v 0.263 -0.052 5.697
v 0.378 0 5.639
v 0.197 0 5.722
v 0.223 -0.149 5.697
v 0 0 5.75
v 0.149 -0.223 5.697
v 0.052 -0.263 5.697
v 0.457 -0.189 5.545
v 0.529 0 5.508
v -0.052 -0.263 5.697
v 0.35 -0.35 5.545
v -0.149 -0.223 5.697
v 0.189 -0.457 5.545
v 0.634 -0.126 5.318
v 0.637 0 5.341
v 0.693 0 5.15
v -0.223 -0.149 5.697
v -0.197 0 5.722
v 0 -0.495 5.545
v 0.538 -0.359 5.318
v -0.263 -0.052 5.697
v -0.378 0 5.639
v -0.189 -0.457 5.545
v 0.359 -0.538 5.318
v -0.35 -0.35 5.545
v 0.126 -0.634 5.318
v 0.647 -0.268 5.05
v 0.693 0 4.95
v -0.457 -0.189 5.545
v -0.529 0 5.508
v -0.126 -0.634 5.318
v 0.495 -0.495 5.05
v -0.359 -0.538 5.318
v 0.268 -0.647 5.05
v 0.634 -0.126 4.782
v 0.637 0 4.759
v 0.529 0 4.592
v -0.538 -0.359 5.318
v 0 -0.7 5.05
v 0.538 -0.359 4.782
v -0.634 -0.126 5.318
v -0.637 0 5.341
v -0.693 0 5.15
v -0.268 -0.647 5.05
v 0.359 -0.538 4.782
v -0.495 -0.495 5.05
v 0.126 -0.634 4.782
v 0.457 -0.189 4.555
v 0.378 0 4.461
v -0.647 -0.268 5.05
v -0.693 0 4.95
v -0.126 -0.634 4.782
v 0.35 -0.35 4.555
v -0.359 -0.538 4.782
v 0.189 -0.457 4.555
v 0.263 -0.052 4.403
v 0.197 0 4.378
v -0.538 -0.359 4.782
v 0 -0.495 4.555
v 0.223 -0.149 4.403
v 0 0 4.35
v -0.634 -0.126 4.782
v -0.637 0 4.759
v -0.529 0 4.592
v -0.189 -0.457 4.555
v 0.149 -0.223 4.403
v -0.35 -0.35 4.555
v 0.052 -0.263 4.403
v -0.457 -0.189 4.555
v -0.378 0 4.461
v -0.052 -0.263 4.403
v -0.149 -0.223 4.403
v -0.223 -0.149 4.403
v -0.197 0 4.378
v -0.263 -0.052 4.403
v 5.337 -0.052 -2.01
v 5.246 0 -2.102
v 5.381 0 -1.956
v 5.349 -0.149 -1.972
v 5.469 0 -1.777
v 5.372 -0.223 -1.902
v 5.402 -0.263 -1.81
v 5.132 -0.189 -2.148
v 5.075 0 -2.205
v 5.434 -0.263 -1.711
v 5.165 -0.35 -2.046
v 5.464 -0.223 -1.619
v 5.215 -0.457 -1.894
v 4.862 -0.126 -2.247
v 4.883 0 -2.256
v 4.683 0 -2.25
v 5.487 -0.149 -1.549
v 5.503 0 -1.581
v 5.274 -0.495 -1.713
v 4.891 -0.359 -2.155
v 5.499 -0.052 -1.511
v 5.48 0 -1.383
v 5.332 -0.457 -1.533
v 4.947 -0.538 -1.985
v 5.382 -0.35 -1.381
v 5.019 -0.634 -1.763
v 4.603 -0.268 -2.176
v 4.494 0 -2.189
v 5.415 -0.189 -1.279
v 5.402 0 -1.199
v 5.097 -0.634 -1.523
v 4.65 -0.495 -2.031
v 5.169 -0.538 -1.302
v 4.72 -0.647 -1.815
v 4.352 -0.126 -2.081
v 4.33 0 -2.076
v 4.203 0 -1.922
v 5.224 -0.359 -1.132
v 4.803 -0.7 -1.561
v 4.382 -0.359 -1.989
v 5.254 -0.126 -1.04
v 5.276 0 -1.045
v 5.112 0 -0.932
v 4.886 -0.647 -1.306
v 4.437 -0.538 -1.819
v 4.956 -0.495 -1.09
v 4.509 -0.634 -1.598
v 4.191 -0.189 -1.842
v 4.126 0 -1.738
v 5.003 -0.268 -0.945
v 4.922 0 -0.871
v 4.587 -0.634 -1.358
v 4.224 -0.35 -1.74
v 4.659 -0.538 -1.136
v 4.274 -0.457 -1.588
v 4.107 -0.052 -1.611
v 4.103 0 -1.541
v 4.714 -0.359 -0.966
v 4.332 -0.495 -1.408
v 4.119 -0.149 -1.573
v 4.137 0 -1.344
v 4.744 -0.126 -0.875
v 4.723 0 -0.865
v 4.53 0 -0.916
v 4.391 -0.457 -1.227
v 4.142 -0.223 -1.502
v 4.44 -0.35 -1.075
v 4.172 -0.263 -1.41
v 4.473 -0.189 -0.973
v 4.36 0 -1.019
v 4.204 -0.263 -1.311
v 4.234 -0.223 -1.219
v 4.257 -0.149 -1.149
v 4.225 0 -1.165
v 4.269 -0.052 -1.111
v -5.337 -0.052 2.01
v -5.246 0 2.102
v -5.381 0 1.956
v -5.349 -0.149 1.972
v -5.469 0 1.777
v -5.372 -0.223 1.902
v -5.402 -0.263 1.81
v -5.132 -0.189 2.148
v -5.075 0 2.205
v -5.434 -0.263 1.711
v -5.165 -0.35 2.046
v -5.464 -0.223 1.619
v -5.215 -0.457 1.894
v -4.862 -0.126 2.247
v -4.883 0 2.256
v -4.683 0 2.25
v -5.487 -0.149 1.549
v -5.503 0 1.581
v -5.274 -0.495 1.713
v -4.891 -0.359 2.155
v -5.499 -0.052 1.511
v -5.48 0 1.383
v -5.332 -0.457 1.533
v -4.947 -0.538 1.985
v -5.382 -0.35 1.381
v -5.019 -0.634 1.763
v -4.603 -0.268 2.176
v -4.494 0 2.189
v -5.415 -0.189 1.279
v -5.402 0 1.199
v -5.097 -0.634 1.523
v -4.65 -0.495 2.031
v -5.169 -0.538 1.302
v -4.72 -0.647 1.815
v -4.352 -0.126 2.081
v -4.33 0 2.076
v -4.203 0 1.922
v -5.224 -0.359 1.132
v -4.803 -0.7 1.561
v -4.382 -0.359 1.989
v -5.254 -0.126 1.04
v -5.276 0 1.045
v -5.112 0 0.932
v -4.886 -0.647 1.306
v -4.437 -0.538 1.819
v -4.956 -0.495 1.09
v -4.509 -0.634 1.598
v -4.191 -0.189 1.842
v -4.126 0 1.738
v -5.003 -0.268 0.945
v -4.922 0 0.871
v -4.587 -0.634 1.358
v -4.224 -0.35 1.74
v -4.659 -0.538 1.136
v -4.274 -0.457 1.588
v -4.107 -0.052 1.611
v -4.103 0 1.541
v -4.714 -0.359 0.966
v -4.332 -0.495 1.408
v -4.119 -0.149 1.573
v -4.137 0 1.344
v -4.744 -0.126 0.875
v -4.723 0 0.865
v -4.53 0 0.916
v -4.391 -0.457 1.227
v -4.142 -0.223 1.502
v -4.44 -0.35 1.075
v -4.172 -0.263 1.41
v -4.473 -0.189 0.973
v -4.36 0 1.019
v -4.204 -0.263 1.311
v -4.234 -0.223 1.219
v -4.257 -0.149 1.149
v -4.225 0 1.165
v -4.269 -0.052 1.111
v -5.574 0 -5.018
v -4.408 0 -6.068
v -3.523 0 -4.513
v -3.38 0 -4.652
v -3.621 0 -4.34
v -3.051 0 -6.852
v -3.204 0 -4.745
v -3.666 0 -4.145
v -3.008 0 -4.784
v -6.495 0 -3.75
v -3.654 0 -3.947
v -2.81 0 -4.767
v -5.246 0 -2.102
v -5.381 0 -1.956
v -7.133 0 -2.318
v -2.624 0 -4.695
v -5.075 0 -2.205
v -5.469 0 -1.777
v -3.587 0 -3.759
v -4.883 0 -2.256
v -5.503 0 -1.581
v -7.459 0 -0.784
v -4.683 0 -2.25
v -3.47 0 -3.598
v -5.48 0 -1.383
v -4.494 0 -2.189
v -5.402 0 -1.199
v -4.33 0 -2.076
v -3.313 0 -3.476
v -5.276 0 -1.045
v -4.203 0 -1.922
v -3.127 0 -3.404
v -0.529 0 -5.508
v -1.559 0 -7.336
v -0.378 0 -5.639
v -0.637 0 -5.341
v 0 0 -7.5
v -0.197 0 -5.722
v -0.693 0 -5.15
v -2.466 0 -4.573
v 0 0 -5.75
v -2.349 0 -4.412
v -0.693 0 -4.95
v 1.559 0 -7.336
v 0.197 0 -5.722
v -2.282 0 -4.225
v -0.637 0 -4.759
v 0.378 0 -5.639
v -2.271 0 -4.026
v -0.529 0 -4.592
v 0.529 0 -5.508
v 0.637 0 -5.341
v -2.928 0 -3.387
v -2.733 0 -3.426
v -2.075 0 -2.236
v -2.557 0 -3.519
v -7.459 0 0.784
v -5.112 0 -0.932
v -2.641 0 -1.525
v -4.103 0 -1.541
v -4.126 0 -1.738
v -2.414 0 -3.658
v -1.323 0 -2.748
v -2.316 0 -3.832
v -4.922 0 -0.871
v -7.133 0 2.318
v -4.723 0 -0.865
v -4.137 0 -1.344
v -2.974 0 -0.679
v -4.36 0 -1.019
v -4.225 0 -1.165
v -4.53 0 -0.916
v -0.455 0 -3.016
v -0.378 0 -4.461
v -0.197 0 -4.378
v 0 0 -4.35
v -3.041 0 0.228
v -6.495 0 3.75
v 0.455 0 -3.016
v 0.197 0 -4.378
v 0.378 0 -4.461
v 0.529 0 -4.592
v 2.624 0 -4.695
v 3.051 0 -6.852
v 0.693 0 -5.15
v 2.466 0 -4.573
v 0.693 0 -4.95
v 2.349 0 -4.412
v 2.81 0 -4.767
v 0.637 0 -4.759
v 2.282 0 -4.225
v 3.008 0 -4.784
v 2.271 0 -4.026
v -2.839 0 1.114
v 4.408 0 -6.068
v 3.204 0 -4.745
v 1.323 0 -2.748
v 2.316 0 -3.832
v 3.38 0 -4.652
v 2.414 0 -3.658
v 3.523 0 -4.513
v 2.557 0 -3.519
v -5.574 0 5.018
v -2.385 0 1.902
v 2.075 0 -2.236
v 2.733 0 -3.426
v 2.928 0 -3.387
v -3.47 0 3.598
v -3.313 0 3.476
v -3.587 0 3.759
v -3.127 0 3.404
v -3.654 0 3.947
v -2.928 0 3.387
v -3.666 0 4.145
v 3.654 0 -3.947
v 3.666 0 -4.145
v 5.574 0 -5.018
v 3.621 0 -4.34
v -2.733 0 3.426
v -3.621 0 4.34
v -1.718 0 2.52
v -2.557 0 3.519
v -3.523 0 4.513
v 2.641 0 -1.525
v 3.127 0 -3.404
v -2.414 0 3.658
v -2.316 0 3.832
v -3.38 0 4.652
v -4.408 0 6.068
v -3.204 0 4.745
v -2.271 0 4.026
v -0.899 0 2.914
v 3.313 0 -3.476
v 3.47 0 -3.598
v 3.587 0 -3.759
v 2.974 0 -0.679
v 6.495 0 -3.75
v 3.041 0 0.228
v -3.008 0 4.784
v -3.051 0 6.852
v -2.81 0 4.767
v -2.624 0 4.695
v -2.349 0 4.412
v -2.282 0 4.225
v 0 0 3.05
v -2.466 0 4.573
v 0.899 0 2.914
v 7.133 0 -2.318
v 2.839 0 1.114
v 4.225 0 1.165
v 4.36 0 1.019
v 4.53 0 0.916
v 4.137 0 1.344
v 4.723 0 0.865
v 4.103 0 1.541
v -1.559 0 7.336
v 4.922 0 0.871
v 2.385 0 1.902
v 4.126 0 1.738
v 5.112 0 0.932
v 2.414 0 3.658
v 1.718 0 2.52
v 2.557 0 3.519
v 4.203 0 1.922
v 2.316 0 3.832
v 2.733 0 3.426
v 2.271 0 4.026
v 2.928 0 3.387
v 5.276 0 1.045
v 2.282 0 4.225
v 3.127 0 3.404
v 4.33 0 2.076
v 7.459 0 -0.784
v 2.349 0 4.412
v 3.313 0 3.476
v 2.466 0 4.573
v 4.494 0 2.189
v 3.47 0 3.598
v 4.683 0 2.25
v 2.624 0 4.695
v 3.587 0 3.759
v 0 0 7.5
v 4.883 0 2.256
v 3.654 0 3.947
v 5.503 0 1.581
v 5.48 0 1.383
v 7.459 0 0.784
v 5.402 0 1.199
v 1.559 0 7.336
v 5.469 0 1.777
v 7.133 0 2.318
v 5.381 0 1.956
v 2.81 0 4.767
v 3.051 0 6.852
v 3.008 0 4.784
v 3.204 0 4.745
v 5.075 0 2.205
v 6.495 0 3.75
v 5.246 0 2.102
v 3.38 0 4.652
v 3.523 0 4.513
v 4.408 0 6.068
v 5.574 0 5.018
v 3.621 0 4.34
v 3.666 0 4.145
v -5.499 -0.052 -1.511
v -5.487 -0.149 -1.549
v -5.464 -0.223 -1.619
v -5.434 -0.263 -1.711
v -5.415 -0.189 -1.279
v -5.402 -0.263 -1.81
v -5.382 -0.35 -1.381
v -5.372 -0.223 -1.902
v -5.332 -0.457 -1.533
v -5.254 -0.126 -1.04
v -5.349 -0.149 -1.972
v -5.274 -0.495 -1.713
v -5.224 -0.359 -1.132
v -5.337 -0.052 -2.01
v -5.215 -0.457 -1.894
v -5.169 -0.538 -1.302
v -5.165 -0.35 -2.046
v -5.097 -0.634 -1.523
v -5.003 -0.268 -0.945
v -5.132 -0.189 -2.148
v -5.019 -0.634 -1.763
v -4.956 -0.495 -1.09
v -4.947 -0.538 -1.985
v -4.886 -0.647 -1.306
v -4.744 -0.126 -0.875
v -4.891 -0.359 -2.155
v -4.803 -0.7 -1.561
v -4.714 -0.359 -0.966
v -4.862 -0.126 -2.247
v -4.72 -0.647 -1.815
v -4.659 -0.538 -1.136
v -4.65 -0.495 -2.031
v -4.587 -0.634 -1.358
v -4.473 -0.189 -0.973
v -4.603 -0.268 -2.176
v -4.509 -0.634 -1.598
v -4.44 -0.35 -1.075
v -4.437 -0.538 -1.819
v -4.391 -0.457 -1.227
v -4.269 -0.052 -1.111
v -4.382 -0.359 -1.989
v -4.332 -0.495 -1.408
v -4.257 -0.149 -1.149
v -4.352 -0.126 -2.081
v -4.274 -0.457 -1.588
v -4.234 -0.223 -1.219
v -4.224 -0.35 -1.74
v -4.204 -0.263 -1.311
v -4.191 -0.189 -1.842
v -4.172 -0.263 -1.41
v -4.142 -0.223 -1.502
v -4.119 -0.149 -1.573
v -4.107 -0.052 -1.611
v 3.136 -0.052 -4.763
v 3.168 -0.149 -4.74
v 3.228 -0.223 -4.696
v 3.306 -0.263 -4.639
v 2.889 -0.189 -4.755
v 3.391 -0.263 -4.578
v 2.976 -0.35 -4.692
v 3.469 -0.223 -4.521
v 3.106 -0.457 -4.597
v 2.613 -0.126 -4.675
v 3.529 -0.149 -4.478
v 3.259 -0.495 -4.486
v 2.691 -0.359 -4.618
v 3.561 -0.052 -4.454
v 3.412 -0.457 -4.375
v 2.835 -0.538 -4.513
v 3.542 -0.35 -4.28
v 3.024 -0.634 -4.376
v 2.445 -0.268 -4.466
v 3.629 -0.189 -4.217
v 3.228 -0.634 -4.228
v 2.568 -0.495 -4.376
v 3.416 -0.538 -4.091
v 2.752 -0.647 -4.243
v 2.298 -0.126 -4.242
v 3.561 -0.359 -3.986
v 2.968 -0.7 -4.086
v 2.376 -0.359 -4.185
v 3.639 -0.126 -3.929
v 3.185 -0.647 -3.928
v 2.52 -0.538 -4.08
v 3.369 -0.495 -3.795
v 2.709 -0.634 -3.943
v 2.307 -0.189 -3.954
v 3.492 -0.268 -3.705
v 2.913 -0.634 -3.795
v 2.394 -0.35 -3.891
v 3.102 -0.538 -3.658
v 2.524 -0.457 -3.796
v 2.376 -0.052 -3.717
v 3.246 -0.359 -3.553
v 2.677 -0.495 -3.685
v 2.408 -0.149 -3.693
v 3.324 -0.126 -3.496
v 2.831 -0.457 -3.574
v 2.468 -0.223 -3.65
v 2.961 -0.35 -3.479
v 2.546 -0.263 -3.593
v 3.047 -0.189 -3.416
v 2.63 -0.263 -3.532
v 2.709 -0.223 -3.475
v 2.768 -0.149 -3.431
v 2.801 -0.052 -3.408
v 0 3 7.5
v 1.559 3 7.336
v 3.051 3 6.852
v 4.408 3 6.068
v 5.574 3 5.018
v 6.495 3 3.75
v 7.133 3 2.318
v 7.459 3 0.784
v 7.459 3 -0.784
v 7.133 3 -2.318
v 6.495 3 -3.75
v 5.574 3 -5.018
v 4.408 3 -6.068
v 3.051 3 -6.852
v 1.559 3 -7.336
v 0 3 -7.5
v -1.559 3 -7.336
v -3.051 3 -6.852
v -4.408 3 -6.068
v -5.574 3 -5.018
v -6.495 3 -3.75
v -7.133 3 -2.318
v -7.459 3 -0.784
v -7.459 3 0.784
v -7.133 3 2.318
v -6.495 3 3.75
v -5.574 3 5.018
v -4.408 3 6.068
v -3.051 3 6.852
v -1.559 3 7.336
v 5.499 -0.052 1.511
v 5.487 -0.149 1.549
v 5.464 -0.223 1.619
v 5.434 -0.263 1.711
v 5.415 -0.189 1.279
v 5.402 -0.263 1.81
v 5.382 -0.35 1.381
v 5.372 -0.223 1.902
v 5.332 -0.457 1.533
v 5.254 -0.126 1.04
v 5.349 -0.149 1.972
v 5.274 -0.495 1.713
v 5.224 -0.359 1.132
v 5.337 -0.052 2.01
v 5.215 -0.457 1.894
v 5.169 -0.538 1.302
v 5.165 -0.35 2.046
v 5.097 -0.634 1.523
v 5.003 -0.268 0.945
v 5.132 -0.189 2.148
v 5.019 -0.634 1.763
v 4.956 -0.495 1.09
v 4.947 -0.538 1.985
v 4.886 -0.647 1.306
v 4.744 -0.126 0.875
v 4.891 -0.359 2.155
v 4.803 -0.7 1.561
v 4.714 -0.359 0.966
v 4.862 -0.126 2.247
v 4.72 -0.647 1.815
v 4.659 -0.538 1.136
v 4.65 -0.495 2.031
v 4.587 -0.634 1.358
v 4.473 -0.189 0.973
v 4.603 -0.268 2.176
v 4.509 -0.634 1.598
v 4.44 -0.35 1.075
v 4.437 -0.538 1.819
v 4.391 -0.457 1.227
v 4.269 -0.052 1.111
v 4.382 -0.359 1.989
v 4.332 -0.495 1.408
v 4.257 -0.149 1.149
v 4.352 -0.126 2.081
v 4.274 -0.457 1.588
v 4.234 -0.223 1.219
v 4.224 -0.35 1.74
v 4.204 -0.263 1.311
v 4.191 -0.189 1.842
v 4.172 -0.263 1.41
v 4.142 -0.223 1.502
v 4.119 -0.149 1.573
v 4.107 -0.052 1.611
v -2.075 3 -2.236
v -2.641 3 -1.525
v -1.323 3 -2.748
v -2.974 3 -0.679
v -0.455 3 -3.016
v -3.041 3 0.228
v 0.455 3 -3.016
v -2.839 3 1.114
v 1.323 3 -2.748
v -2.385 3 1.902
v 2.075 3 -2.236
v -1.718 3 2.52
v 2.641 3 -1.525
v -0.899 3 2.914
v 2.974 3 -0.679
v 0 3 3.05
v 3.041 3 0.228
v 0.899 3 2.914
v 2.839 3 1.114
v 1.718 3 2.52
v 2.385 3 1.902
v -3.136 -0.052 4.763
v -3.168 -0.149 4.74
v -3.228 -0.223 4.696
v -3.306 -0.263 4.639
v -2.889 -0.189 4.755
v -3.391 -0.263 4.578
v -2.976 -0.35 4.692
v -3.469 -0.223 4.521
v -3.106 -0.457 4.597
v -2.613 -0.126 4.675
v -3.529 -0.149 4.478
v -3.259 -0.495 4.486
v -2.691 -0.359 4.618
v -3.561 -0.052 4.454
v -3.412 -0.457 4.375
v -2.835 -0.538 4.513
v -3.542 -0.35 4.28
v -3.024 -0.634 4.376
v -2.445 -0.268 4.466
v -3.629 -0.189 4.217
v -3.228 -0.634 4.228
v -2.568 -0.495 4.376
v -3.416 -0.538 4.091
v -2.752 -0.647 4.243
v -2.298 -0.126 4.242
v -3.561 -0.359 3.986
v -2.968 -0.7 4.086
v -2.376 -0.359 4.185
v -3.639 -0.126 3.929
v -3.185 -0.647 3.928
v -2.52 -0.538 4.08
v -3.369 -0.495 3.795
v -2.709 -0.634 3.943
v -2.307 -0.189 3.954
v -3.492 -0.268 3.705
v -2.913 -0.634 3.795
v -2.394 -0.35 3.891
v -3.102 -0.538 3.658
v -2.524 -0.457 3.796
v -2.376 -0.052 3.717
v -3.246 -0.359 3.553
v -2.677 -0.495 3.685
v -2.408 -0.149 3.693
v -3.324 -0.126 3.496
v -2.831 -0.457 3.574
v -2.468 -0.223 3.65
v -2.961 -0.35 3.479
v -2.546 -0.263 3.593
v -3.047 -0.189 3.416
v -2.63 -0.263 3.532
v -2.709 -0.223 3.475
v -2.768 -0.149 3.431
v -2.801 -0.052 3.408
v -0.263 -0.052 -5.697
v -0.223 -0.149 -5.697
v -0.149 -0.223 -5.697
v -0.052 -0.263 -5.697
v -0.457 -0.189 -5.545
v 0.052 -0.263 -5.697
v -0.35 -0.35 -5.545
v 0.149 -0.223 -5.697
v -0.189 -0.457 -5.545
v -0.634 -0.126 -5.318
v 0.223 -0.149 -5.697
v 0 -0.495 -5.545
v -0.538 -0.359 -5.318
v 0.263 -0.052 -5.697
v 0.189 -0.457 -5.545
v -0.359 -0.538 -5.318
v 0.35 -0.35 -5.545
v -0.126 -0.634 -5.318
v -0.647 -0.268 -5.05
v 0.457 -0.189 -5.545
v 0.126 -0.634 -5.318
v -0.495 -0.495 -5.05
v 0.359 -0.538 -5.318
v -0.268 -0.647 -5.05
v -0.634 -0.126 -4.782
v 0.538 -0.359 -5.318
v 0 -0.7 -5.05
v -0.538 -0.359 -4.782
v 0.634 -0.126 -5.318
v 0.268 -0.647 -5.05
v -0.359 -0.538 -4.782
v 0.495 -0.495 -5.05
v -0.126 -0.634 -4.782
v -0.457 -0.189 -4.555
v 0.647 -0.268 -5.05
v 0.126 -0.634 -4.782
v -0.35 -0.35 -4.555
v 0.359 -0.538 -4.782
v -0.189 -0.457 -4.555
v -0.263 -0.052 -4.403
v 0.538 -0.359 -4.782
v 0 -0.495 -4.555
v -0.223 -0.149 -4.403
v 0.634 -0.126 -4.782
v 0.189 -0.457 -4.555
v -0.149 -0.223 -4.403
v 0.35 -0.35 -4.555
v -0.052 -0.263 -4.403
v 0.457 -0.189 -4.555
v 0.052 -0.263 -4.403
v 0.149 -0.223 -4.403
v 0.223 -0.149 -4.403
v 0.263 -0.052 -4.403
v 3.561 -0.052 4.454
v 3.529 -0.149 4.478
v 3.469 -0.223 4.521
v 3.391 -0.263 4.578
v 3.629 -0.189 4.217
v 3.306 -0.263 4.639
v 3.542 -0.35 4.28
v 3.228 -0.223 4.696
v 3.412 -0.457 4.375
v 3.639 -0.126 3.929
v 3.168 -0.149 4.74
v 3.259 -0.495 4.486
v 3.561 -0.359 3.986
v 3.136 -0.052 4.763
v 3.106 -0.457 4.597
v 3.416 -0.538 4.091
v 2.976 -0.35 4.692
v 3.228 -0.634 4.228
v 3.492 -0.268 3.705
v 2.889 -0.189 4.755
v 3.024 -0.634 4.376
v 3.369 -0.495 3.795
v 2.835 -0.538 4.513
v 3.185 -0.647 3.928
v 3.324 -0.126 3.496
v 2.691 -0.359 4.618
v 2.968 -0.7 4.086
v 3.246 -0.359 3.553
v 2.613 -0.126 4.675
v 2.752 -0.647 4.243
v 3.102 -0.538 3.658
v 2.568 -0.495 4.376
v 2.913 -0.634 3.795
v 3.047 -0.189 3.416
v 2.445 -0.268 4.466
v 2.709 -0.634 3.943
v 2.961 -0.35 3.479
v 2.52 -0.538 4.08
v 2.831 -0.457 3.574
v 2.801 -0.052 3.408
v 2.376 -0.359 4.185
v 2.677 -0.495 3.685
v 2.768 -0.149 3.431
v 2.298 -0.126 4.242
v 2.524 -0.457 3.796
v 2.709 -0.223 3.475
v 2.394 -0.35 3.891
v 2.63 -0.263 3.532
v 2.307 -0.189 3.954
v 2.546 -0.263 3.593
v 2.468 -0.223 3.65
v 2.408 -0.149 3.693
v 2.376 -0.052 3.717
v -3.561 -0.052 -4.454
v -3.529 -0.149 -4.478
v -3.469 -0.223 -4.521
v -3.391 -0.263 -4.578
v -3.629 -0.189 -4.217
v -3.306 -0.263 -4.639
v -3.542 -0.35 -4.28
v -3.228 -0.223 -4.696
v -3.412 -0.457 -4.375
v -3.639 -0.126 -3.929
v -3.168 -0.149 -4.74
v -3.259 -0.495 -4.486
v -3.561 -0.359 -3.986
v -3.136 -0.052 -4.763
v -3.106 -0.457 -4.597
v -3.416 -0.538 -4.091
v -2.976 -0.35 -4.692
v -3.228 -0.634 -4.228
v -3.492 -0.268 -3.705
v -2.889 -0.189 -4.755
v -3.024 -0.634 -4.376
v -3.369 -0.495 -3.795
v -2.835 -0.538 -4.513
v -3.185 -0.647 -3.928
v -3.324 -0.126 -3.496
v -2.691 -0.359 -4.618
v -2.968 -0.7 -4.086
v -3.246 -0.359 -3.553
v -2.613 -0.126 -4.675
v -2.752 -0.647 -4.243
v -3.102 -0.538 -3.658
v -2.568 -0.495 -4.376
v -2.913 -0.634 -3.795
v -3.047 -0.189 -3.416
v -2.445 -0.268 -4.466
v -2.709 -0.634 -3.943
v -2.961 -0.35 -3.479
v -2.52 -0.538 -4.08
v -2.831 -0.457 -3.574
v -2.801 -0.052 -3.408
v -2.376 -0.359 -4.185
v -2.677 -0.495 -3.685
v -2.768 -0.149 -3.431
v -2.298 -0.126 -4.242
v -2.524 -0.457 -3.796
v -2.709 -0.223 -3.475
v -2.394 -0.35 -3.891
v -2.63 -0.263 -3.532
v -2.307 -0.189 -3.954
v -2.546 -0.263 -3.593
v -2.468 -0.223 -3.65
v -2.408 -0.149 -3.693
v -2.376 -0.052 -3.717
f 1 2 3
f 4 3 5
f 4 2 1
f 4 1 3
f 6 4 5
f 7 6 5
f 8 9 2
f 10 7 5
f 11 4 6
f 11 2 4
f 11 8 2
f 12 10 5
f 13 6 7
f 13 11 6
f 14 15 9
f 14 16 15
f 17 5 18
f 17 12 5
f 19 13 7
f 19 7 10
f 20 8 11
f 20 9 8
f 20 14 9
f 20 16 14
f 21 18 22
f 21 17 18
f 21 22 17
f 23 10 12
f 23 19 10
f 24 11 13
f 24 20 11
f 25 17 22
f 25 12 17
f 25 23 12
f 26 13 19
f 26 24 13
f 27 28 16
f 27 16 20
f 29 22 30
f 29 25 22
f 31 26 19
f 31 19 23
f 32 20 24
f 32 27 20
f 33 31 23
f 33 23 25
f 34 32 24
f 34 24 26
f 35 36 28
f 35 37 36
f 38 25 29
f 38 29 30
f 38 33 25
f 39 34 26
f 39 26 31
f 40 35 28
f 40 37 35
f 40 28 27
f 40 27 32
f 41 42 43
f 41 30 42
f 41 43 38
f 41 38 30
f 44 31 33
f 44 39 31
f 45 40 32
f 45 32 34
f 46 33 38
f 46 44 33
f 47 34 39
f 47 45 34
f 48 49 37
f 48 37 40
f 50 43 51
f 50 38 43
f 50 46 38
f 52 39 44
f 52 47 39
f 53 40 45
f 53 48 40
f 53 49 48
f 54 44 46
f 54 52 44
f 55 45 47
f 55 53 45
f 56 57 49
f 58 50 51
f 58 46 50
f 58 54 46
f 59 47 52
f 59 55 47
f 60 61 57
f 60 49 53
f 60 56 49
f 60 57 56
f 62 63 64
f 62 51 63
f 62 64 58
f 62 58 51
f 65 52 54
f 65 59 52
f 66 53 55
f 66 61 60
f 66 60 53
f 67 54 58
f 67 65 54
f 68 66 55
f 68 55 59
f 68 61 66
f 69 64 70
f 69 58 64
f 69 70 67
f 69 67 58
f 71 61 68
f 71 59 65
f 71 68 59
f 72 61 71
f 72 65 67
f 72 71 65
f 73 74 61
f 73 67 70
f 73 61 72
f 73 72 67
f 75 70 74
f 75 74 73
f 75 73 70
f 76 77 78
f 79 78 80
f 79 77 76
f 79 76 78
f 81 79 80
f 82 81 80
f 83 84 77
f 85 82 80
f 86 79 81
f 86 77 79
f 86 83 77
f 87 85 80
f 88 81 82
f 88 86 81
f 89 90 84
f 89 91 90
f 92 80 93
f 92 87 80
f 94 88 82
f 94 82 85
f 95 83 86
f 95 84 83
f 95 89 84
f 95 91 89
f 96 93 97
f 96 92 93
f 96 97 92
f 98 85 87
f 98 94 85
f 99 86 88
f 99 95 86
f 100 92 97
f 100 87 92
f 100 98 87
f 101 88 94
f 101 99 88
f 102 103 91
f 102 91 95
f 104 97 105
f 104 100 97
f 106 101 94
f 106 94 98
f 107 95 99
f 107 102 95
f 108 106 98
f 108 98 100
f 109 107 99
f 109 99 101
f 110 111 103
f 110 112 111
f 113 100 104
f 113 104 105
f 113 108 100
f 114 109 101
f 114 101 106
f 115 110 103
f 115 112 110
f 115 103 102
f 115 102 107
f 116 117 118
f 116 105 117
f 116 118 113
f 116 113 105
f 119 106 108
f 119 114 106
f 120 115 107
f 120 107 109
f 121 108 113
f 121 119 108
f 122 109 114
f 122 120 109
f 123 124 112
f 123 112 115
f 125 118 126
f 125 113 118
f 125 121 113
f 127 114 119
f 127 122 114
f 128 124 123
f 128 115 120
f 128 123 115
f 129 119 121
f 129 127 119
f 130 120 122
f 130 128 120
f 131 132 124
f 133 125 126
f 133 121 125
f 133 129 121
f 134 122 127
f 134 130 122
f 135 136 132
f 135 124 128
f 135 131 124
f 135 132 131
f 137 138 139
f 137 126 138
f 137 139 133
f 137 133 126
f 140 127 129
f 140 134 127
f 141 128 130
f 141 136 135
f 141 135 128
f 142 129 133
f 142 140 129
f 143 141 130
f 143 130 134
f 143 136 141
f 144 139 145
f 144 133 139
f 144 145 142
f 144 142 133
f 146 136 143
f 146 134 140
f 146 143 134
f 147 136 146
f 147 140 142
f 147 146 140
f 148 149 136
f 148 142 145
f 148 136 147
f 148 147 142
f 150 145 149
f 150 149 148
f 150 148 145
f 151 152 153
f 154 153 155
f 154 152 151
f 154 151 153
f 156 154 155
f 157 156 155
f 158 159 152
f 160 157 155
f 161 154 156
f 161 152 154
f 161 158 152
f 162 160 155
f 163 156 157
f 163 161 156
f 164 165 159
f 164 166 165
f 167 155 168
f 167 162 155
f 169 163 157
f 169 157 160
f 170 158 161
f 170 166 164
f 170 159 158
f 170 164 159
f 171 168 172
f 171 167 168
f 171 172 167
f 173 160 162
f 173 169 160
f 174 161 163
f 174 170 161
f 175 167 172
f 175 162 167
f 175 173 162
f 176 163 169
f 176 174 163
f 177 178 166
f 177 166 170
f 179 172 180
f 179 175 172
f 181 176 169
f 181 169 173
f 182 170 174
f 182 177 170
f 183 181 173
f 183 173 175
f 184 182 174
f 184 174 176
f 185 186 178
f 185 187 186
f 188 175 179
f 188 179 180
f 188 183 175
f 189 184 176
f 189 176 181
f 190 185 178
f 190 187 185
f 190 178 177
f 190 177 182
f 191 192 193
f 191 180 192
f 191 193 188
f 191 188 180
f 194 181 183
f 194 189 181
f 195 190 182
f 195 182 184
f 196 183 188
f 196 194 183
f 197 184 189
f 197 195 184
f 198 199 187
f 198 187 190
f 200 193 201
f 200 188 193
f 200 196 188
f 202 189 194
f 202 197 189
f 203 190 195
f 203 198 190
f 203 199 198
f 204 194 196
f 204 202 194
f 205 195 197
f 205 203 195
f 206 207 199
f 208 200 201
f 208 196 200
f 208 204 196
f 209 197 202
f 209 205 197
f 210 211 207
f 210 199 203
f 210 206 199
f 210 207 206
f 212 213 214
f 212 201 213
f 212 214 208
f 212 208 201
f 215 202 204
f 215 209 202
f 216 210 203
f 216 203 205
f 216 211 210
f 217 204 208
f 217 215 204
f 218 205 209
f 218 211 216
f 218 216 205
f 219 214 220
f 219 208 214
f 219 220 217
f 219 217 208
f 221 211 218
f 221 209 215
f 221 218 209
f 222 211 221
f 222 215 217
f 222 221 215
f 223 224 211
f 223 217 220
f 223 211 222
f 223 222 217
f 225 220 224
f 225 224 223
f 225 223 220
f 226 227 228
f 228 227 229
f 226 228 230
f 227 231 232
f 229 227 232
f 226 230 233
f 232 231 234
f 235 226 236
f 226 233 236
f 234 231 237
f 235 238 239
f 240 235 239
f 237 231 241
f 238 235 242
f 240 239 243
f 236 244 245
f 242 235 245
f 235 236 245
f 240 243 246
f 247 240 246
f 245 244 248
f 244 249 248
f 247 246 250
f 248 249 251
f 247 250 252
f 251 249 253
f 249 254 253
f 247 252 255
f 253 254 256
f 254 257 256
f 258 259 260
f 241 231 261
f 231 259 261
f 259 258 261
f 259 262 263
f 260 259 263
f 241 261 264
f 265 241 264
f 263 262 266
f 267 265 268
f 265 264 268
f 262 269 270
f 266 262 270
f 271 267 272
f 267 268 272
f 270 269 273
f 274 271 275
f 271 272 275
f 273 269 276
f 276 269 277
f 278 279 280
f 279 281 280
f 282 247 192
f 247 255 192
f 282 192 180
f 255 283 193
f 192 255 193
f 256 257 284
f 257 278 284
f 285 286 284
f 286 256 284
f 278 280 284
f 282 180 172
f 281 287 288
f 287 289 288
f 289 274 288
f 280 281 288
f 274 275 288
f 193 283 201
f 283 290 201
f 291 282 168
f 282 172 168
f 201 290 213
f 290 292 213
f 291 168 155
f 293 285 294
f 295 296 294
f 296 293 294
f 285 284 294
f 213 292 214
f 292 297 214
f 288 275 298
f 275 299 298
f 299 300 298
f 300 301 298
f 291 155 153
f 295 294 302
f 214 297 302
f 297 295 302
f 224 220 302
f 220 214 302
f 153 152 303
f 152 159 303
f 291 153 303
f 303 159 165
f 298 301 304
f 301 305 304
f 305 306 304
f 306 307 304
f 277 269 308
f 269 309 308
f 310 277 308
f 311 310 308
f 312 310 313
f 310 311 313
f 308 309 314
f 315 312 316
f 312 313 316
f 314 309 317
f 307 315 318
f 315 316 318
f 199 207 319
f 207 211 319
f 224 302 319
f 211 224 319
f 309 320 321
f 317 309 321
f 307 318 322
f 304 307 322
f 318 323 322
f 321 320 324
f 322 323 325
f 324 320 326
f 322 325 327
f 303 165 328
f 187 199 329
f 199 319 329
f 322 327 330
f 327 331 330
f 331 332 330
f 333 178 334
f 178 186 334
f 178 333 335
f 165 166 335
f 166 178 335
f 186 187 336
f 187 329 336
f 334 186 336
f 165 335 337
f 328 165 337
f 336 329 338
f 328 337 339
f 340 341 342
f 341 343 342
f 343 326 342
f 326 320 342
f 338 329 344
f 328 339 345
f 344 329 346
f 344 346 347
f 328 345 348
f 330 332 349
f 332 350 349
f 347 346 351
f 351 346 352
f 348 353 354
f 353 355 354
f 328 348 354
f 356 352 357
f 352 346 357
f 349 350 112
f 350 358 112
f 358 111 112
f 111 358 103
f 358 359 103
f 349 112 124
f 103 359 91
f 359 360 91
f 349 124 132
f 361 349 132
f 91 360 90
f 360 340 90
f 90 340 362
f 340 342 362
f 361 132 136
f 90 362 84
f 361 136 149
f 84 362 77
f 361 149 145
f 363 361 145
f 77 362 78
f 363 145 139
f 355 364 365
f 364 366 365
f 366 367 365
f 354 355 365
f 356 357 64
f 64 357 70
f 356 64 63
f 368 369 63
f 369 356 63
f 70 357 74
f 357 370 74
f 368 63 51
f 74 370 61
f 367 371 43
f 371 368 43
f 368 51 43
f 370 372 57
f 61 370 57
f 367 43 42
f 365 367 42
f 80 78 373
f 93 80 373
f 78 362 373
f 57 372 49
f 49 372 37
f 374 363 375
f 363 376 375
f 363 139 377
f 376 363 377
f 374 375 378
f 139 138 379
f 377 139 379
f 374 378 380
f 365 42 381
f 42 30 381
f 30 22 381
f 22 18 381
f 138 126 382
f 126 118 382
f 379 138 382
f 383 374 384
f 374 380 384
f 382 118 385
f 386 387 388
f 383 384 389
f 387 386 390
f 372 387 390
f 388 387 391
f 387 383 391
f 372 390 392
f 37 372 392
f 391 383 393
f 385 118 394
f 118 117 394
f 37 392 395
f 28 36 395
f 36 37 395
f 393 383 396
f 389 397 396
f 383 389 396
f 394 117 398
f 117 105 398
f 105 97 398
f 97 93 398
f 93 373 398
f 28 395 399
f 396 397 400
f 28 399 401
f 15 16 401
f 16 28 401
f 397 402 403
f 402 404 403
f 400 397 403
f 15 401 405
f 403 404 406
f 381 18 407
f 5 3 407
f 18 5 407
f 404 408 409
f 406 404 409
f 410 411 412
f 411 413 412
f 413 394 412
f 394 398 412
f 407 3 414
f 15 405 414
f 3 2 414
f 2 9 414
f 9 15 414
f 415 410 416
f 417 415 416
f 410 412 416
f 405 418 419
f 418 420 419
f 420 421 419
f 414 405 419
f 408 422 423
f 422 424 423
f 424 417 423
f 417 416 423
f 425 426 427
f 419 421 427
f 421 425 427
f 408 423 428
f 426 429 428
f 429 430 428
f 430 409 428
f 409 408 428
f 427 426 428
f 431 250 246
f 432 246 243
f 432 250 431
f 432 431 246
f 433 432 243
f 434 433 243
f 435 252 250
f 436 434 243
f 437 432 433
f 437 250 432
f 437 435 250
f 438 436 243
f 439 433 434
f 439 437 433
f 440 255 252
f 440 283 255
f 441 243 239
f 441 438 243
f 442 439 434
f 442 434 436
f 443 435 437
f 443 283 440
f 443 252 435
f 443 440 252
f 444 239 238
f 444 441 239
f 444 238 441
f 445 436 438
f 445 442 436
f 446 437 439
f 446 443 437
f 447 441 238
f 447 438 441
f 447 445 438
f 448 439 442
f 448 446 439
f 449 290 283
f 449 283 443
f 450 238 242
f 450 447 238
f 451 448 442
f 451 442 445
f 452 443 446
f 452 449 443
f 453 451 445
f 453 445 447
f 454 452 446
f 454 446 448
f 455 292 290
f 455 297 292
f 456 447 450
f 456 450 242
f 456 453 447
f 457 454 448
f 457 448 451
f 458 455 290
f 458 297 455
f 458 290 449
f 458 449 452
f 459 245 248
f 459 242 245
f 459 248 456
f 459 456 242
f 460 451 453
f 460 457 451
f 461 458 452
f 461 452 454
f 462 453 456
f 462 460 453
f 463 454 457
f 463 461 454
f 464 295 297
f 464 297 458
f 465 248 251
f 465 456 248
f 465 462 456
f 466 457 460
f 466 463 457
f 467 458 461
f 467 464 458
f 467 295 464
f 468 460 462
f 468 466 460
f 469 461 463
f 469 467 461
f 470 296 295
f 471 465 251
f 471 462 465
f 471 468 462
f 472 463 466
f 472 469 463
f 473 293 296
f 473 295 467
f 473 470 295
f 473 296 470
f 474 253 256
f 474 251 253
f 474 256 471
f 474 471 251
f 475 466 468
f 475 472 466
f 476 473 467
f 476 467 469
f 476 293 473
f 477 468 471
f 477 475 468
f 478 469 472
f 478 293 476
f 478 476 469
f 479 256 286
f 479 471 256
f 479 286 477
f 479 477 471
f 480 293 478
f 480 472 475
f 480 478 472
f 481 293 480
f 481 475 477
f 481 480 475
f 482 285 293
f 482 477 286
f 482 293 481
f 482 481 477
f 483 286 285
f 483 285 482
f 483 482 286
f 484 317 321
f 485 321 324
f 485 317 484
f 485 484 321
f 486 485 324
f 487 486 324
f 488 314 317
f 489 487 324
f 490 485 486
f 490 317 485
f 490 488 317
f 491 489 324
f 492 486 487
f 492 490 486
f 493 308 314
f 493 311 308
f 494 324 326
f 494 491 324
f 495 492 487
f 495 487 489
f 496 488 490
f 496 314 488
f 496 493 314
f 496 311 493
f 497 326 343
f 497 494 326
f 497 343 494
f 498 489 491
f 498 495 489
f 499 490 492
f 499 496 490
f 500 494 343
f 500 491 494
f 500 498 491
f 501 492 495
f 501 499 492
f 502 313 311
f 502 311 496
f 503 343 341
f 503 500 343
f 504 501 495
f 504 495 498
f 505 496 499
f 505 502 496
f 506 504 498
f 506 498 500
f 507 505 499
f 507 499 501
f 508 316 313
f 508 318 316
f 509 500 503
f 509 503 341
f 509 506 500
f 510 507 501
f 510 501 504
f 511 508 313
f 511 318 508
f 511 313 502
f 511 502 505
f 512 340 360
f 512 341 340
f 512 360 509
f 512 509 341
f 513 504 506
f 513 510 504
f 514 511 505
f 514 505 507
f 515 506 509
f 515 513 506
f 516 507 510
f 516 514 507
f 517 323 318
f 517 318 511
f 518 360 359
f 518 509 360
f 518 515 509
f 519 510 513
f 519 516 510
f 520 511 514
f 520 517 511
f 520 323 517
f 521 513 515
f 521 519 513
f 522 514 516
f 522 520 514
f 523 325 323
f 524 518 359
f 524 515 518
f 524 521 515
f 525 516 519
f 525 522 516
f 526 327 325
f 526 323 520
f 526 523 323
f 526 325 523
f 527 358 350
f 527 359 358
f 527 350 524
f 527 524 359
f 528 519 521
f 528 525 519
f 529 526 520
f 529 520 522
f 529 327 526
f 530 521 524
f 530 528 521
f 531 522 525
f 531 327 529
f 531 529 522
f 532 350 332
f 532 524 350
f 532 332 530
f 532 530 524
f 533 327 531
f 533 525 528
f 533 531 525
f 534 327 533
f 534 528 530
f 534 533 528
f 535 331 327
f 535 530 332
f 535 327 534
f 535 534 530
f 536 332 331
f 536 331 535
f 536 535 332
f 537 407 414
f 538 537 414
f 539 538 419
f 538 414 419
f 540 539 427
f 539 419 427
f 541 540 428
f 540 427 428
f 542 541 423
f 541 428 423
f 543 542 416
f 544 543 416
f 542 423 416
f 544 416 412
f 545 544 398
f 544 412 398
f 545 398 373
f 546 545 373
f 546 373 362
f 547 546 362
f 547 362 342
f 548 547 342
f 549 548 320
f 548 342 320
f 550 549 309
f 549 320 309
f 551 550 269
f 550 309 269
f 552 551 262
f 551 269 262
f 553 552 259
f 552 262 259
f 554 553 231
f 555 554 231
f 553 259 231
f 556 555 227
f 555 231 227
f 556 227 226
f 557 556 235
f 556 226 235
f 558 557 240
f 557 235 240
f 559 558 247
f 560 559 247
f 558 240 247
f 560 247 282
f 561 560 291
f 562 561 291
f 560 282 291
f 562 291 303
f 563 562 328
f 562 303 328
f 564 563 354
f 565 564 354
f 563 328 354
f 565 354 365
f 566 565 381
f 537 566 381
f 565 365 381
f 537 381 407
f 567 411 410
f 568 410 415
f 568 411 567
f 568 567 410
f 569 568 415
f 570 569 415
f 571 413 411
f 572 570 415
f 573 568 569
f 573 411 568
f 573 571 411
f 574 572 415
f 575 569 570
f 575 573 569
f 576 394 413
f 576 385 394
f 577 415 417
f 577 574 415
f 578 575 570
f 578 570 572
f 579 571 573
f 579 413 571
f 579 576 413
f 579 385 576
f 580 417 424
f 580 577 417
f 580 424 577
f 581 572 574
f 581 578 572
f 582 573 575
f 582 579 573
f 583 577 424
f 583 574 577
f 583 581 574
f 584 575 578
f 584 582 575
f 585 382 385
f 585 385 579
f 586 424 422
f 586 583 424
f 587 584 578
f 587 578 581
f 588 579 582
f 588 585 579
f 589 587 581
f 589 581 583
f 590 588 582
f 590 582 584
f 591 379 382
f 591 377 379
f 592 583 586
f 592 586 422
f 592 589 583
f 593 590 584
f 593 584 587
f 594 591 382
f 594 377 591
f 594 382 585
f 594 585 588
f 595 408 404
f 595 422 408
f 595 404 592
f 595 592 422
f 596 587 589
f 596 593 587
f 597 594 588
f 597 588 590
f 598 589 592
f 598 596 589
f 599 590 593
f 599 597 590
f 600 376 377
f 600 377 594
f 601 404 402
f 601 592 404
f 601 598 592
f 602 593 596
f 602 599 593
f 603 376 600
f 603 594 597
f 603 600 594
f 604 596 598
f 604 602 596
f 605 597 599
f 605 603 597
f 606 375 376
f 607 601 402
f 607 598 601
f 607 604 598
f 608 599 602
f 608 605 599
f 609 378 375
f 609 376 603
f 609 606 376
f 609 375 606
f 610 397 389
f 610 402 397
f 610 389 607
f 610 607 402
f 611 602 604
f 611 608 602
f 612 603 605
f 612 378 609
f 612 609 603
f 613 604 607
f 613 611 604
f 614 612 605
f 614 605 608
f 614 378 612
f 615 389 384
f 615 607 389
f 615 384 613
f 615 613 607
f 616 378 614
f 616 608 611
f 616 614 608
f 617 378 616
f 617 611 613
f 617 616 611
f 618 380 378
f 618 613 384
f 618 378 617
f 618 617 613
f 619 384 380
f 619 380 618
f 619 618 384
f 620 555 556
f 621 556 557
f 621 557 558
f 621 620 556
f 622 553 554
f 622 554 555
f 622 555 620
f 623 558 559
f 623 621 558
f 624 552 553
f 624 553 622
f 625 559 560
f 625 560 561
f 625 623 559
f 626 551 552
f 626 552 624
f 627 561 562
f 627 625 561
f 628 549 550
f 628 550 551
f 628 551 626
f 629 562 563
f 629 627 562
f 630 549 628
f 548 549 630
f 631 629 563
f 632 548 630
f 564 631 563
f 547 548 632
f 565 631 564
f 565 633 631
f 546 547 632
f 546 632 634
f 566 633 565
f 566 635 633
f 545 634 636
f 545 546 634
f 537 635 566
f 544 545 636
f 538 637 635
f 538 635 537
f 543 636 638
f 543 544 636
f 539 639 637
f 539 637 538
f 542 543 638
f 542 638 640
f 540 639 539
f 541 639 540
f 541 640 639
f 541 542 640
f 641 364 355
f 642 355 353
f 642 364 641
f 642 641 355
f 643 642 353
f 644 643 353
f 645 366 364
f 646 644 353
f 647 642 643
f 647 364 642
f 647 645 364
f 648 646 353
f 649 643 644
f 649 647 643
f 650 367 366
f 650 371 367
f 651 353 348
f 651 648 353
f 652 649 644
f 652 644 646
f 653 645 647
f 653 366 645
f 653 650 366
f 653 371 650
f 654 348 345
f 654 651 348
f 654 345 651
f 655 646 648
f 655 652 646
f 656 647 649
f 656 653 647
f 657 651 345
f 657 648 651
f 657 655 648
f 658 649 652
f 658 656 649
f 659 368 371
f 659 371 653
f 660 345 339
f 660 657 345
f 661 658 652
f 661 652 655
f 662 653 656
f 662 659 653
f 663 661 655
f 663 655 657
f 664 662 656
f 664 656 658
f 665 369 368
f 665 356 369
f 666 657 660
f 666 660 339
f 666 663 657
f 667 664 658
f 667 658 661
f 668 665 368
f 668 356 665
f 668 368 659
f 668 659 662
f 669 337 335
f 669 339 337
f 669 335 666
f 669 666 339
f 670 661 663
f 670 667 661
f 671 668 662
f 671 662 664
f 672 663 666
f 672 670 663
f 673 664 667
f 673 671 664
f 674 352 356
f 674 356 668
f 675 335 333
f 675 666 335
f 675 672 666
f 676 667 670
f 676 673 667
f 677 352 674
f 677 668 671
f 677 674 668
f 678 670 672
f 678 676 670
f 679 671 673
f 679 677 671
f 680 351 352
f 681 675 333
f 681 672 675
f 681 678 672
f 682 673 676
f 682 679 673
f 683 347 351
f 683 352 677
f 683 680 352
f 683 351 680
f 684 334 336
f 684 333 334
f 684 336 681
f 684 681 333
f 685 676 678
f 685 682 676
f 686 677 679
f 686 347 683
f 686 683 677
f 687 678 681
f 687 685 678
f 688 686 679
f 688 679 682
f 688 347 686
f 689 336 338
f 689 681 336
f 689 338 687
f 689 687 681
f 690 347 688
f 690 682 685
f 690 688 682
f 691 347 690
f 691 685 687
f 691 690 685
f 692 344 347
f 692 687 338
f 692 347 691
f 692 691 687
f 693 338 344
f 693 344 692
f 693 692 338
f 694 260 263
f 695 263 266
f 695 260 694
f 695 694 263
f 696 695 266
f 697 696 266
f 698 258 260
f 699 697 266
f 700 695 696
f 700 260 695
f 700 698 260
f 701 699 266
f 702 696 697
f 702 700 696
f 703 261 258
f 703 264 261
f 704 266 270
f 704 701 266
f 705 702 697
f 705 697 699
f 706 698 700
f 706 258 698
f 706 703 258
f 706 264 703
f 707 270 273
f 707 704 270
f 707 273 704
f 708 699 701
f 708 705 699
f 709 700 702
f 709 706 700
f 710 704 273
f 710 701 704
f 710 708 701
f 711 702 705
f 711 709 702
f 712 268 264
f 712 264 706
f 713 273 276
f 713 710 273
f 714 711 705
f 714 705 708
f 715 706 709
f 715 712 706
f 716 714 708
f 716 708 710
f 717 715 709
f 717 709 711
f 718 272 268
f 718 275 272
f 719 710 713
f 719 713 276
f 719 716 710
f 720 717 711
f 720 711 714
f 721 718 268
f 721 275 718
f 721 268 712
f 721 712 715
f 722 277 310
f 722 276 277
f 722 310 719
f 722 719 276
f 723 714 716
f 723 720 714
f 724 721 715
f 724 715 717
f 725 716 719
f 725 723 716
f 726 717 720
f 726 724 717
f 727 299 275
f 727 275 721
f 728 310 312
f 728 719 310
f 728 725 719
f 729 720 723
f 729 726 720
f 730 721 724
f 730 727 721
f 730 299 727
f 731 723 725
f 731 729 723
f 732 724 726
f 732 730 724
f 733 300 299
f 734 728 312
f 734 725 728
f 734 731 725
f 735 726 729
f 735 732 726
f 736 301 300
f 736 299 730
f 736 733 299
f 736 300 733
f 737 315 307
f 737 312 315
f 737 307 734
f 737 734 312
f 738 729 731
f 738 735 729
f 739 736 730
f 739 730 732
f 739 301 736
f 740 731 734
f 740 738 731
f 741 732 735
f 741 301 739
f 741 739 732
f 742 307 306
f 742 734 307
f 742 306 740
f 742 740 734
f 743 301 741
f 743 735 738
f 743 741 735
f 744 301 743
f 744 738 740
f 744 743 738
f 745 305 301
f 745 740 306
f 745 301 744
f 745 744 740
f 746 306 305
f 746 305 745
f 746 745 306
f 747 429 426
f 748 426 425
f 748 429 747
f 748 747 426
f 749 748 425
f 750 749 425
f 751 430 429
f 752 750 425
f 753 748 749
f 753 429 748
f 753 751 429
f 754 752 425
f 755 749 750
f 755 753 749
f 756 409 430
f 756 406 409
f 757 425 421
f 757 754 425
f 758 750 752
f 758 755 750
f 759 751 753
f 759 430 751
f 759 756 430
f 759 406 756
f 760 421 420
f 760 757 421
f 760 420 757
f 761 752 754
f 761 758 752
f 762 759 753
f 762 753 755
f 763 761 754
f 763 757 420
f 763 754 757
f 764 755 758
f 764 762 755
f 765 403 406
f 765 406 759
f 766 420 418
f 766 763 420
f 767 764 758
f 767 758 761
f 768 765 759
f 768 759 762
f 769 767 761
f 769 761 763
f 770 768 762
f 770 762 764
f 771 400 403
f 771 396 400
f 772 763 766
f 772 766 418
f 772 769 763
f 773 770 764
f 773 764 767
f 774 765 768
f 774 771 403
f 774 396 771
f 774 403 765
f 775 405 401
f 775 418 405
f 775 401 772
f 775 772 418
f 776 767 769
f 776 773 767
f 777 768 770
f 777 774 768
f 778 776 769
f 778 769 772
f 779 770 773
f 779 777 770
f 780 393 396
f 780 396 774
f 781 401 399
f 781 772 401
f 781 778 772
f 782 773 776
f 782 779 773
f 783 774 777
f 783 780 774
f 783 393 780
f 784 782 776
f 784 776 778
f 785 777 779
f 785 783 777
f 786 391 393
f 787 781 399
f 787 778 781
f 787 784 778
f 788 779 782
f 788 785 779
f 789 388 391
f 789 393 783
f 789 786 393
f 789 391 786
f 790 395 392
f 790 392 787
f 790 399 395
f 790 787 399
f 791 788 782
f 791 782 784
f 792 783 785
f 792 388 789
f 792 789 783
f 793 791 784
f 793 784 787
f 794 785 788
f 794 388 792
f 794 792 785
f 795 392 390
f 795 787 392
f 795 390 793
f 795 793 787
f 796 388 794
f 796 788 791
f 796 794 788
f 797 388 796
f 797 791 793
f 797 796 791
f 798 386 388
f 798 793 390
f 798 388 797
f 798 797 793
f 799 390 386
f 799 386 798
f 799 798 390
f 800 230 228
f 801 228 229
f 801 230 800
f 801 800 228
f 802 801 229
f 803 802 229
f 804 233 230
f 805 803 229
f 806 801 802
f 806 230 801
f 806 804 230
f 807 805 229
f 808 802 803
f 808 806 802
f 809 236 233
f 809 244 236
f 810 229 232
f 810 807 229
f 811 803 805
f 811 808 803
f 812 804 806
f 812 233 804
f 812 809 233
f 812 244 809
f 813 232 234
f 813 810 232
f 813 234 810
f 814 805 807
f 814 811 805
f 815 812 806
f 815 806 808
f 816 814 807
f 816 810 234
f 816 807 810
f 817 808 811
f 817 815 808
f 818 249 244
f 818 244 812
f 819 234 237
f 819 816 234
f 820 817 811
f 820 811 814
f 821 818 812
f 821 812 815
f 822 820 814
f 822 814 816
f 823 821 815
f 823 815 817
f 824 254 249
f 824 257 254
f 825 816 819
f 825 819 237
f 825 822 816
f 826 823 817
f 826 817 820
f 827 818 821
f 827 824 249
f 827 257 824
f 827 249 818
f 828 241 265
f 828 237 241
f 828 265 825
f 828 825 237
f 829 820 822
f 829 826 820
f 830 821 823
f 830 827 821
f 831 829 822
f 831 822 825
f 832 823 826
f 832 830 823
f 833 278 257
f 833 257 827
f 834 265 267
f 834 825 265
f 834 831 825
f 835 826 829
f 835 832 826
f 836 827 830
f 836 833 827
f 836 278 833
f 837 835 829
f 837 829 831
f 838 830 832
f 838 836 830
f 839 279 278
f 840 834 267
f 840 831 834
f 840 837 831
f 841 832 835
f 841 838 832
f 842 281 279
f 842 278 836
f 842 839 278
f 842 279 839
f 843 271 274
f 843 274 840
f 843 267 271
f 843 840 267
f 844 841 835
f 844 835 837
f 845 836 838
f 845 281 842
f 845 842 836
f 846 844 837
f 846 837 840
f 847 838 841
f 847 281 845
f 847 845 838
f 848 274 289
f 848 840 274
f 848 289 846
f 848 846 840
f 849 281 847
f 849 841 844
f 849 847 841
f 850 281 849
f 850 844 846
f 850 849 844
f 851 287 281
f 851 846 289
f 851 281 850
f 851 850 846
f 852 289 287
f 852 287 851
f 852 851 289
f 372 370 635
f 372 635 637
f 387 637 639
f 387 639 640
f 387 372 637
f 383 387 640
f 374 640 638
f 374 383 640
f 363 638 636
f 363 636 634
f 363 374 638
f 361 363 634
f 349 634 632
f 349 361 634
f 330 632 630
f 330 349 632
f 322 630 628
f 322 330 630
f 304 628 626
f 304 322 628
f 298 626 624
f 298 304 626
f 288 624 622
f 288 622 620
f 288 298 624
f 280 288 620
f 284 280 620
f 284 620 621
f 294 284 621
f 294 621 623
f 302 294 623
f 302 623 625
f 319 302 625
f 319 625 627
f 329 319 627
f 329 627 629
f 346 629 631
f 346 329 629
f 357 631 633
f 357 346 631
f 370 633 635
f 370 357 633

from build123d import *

# Parameters (mm, degrees)
SKETCH1_R           = 7.5
SKETCH1_R_2         = 3.05
BOSS_EXTRUDE1_DEPTH = 3
CIRPATTERN1_COUNT   = 10


with BuildPart() as part:
    # Sketch1 → Boss-Extrude1 (new body)
    with BuildSketch(Plane(origin=(0, 0, 0), x_dir=(1, 0, 0), z_dir=(0, 1, 0))):
        Circle(SKETCH1_R)
        Circle(SKETCH1_R_2, mode=Mode.SUBTRACT)
    extrude(amount=BOSS_EXTRUDE1_DEPTH)

    # Sketch3 → Revolve2 (revolve)
    with BuildSketch(Plane(origin=(0, 0, 0), x_dir=(0, 0, -1), z_dir=(1, 0, 0))):
        with BuildLine():
            Line((4.35, 0), (5.75, 0))
            ThreePointArc((5.75, 0), (5.05, -0.7), (4.35, 0))
        make_face()
    revolve2 = revolve(axis=Axis((0, 0, -8.25), (0, 0, 1)))

    # CirPattern1: Revolve2 ×10 about axis
    cirpattern1_axis = Axis((0, -0.885, 0), (0, 1, 0))
    for i in range(1, CIRPATTERN1_COUNT):
        add(revolve2.rotate(cirpattern1_axis, i * 360 / CIRPATTERN1_COUNT))


solid = part.part
